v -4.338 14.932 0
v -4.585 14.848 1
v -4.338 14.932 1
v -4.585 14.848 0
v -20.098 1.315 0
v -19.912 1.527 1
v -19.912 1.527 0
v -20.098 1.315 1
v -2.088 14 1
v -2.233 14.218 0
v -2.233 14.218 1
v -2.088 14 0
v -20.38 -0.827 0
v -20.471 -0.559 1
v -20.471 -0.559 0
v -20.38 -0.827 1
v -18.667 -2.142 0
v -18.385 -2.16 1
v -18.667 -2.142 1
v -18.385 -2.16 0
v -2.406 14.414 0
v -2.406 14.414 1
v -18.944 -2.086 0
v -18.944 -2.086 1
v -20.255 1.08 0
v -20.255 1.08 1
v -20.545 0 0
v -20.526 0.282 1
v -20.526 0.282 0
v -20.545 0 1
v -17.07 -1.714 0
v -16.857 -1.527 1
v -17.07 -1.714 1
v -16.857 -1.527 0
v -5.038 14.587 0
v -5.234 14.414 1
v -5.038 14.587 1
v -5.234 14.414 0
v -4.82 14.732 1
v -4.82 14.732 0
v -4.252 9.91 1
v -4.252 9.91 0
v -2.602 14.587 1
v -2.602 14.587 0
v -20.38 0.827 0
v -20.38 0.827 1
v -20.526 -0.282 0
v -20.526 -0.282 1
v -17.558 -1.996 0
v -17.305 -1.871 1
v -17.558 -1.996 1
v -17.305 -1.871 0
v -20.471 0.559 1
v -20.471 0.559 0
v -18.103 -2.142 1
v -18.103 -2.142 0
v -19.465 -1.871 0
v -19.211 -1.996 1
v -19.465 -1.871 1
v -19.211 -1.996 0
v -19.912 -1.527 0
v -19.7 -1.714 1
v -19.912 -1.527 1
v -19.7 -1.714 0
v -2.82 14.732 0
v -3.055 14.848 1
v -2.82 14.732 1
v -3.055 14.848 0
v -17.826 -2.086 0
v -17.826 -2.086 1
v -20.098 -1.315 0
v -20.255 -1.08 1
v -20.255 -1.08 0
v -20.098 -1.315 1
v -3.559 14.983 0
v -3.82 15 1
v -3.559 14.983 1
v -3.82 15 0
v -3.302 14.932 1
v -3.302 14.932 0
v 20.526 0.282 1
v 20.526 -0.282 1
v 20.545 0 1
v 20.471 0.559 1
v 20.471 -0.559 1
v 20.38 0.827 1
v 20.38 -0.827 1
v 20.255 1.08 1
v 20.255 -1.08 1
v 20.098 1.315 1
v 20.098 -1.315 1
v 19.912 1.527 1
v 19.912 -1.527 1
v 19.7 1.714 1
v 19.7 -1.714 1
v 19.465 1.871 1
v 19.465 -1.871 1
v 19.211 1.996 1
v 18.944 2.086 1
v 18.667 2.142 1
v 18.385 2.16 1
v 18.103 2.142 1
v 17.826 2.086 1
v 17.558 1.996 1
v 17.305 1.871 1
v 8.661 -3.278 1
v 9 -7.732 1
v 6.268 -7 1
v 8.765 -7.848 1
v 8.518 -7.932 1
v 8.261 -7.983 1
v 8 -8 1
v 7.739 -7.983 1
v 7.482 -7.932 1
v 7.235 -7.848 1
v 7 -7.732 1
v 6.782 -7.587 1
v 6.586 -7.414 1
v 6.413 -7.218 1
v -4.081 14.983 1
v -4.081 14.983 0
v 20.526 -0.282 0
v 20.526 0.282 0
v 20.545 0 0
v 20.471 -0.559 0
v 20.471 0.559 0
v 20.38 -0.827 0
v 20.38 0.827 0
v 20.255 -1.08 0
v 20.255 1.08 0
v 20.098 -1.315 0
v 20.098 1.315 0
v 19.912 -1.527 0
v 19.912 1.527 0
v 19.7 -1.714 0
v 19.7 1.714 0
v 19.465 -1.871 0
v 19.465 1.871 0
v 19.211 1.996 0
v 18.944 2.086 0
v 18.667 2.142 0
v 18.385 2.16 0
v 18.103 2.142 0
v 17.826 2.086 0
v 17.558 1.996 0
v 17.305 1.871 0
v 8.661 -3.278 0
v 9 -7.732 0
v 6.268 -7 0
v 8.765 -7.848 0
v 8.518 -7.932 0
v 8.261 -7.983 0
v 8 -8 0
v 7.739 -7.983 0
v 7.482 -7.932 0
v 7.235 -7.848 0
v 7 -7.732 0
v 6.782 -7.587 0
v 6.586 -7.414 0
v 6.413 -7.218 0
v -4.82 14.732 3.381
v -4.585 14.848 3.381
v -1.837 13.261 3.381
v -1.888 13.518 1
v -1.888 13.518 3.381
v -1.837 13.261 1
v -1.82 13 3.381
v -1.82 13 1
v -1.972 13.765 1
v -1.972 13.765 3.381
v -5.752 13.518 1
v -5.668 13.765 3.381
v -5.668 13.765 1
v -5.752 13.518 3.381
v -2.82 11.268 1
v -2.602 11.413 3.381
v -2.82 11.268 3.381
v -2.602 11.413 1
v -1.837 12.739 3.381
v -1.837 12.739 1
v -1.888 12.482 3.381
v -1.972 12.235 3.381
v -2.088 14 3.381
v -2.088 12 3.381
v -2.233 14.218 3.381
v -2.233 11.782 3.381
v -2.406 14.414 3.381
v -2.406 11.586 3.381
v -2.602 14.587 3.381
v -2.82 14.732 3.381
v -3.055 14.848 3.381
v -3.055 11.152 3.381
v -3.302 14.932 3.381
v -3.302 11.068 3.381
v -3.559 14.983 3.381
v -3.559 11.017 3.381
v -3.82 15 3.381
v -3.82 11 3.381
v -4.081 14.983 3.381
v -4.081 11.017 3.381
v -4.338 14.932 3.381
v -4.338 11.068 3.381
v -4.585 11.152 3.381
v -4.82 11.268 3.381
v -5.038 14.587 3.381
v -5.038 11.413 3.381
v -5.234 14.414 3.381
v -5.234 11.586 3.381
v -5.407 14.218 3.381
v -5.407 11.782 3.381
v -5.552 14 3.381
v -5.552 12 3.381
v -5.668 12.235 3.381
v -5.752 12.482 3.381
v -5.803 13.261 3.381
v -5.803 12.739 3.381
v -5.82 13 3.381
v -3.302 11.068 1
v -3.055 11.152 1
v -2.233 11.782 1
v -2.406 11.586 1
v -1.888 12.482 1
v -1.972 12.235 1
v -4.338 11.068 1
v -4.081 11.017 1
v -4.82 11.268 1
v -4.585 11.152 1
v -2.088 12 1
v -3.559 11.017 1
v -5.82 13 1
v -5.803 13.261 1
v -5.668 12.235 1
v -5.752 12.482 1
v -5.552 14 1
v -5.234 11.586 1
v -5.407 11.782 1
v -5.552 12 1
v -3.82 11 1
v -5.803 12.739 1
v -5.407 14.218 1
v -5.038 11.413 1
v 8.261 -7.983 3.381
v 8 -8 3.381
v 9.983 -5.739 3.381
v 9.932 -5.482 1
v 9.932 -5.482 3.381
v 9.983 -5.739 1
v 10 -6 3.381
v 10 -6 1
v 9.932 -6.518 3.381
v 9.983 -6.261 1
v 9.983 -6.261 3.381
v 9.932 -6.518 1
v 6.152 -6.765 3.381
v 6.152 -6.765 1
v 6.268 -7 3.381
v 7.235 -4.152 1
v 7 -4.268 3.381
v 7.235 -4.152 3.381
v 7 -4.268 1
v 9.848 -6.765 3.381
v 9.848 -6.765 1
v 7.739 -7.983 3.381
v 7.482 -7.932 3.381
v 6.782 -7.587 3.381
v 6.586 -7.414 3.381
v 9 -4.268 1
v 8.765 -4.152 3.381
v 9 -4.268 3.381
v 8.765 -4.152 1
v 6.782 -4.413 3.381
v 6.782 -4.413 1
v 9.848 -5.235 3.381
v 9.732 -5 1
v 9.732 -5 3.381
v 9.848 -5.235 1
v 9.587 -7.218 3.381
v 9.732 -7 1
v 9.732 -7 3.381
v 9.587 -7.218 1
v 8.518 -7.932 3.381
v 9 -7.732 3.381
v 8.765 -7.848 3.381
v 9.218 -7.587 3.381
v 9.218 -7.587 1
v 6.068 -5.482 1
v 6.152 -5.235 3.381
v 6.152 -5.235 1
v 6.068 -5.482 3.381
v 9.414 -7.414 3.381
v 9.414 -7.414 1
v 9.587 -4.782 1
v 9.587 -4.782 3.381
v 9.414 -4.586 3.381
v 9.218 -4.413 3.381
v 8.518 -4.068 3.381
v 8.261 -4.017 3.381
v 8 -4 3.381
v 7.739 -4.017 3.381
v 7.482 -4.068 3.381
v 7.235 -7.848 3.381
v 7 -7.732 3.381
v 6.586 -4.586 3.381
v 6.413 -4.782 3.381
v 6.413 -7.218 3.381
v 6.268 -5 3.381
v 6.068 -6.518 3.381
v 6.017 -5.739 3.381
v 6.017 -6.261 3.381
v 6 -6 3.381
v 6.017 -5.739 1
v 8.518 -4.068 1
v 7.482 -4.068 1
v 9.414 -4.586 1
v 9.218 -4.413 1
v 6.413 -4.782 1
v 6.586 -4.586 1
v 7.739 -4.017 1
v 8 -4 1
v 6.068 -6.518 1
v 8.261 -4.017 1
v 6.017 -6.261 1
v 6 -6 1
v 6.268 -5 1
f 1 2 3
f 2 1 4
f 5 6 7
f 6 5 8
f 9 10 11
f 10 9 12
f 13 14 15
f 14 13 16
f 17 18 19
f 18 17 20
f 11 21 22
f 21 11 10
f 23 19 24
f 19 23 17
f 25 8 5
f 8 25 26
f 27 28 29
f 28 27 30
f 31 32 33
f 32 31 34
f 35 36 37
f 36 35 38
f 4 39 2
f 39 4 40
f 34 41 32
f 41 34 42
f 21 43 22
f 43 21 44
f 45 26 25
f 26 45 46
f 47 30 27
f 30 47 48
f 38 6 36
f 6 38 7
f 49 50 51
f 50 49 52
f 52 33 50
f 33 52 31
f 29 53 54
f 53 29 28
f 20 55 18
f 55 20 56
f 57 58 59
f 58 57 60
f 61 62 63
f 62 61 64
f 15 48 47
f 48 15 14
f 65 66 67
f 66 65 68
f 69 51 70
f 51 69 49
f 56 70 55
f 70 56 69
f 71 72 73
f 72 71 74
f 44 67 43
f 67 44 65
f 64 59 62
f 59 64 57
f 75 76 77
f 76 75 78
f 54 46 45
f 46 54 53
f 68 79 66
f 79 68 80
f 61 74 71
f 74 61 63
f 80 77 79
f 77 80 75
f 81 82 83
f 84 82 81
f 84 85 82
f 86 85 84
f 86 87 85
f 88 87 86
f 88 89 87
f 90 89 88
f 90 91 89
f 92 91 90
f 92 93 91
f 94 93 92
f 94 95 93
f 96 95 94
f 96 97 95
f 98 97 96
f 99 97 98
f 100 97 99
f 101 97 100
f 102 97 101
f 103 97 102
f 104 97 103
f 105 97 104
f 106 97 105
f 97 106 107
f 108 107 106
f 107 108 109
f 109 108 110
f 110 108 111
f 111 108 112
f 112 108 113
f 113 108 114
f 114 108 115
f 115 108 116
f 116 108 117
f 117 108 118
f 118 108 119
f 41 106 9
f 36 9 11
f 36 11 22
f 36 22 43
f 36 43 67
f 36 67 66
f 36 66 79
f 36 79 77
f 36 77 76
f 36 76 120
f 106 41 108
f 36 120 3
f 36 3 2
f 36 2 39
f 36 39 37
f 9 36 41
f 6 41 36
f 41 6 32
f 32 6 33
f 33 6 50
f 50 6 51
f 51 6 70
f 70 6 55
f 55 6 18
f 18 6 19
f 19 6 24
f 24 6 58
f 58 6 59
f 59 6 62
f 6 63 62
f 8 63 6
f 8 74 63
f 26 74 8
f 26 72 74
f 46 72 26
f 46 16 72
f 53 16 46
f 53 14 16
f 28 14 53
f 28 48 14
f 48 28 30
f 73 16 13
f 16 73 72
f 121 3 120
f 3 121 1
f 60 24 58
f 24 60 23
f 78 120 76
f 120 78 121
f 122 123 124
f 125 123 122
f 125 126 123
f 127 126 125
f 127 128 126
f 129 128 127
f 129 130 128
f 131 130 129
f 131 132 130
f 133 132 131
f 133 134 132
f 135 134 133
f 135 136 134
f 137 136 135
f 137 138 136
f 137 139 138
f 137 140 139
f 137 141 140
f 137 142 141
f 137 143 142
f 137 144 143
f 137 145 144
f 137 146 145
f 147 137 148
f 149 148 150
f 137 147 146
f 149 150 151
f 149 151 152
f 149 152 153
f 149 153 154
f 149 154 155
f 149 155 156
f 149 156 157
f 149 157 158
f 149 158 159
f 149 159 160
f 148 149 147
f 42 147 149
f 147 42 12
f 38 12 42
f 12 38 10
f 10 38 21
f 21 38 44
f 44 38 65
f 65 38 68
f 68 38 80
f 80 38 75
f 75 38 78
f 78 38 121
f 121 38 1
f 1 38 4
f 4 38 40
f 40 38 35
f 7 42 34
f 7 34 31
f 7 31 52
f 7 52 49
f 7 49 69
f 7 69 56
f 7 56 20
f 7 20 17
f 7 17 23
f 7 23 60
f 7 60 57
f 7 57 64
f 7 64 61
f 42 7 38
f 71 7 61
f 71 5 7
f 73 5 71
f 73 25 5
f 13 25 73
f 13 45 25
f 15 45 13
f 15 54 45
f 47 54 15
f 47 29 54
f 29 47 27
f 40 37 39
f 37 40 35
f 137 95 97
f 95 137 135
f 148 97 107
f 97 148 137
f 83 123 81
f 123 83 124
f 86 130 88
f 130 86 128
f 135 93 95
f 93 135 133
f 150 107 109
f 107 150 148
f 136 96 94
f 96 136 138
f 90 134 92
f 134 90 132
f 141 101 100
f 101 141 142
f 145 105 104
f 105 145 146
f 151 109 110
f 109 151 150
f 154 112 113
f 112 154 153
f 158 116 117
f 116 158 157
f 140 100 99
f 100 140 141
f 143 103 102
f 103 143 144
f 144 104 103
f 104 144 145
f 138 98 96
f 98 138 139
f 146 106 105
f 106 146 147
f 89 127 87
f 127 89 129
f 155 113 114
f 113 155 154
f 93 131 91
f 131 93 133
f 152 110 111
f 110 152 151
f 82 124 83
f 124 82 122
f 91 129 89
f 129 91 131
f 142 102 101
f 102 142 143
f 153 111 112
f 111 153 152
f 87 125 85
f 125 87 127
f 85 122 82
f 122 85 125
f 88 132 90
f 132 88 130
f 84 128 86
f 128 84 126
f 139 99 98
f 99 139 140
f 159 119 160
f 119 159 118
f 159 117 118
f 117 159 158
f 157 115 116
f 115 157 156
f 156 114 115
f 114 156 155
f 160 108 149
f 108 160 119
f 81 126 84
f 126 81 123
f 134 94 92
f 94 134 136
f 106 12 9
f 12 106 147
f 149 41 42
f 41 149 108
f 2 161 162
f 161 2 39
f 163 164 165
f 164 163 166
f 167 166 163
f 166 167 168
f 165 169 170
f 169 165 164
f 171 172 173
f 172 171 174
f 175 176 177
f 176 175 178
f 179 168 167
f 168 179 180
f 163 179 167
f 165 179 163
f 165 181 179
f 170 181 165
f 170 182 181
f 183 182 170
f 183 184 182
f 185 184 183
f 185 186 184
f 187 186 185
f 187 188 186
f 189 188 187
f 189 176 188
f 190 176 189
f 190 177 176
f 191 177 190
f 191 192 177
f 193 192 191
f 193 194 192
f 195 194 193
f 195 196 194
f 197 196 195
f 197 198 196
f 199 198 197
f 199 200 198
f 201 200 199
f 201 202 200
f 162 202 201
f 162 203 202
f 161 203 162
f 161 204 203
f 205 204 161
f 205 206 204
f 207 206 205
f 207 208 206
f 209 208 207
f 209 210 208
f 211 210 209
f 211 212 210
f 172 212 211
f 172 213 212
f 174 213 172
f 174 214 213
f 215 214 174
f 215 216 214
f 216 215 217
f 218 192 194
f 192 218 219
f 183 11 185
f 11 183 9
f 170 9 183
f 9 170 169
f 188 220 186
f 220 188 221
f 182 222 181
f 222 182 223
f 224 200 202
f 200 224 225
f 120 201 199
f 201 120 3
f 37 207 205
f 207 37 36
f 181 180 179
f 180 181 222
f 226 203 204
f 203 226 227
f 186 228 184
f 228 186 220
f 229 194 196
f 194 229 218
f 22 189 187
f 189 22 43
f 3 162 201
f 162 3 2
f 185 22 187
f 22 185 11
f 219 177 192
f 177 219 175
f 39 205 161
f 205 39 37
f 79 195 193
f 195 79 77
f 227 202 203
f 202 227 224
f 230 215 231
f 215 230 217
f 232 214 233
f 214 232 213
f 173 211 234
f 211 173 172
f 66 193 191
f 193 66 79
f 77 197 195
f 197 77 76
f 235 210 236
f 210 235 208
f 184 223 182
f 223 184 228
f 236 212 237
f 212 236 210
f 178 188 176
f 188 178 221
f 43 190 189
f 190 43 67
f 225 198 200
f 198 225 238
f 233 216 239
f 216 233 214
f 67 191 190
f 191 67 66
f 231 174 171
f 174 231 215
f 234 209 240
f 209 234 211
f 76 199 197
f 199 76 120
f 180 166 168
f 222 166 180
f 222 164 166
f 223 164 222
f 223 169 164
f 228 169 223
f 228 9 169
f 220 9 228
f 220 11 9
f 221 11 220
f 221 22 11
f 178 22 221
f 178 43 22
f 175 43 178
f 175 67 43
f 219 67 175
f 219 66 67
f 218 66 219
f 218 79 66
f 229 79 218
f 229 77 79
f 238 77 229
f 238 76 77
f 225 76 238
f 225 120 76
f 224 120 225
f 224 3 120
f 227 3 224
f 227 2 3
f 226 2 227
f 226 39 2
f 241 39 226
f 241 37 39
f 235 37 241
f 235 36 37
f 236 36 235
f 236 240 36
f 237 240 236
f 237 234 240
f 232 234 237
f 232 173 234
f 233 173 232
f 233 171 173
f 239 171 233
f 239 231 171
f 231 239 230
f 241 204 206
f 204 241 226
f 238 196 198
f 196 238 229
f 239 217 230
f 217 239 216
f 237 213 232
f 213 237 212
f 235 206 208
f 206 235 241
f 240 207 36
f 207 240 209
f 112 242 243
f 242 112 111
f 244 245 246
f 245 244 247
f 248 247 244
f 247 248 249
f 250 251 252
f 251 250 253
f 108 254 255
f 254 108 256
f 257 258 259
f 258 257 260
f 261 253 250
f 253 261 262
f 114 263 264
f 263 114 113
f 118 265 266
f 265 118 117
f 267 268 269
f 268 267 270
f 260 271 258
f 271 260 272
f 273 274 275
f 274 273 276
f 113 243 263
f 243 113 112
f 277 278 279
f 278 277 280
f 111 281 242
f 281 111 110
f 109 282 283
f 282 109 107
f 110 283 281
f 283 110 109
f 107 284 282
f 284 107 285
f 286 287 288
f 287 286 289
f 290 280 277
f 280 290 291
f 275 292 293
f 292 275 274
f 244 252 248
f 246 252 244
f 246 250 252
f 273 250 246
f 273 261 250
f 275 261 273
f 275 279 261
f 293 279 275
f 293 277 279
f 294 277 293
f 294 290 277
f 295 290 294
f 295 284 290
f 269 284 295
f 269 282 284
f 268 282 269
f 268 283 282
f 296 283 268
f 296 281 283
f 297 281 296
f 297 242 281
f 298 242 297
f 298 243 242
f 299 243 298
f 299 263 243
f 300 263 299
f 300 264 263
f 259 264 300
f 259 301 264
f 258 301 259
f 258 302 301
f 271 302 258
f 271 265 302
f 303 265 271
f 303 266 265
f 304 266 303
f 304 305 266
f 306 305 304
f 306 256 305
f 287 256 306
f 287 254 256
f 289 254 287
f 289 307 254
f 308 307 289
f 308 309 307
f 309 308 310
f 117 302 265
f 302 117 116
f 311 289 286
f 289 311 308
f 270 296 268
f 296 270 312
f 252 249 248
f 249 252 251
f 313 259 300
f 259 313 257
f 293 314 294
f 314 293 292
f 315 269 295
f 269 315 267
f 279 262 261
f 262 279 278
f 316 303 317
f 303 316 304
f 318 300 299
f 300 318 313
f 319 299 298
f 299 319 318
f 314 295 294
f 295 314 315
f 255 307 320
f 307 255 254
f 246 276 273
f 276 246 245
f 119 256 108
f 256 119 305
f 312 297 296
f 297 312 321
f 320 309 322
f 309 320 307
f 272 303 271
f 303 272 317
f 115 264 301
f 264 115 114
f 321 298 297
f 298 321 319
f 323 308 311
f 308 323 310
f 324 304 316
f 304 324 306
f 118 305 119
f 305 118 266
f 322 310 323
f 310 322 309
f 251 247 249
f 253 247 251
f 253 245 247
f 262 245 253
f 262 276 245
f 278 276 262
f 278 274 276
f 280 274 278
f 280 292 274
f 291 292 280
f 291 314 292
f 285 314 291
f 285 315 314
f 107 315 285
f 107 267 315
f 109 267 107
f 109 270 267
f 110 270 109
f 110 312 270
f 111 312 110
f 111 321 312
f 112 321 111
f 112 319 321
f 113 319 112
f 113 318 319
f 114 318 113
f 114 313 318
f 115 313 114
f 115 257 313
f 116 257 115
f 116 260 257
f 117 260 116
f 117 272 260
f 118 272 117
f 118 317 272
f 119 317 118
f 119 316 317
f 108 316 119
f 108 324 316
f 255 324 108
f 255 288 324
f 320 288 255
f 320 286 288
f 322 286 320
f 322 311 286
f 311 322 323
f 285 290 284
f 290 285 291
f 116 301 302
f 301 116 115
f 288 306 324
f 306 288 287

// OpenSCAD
VERSION = 1;
INF = 50;

$fn = 48;
MOUNT_PATTERN_LENGTH = 26; 
SCREW_R = 0.6;
SCREW_HEAD_R = 2.16;

mount_r = SCREW_HEAD_R;
frame_w = 2.0;
thickness = 1.0;

//For #00 screw, 3/32in
tap_r = 2; //0.05in r  
tap_h = 2.38125; //3/32in 
vtx_h = 15;//18;
vtx_w = 18;
//cylinder(h=thickness, r = SCREW_HEAD_R);

sidewall_h = 2;
y_offset = 6;
module wall(length){
	cube([thickness, length,2]);
}

module shell(){


	minkowski_h = thickness/2.0;
	intersection(){
		minkowski(){
			difference(){
				cube([INF, INF, minkowski_h], center=true);
				arm(INF);
			}
			cylinder(h=minkowski_h, r = frame_w, center=true);
		}
		arm(thickness);
		}

}

module add_mount(){
	difference(){
		union(){
			cylinder(h=thickness, r = mount_r, center=true);
			shell();
		}
		cylinder(h=INF, r = SCREW_R, center=true);
	}
}



module arm(_thickness){

	y_offset = 6;
	x = sin(45)*MOUNT_PATTERN_LENGTH;
	//Create solid arm
	hull(){
		cylinder(h=_thickness, r = mount_r, center=true);
		translate([x, vtx_h/2.0 - y_offset , 0]) cube([1, vtx_h, _thickness], center=true);
	}
}

module vtx_case_brace(){
	brace_w = 2;
	rotation = atan(vtx_w/vtx_h);
	intersection(){
		union(){
			rotate([0, 0, rotation]) cube([brace_w, INF, thickness], center=true);
			rotate([0, 0, -rotation]) cube([brace_w, INF, thickness], center=true);
		}
		cube([vtx_w, vtx_h, thickness], center=true);
	}
}
module vtx_case(){
	union(){
		difference(){
			cube([vtx_w, vtx_h, thickness], center=true);
			cube([vtx_w-(2*frame_w), vtx_h-(2*frame_w), INF], center=true);
		}
	vtx_case_brace();
	}
}
module sidewalls(){
	x = 4;
	y = 1.5;
	z = sidewall_h + thickness;

	translate([0, -y/2.0 - vtx_h/2.0 , z/2.0]) cube([x, y,z ], center=true);
}

//arm();
//shell();
//add_mount();


module frame(){
	x = sin(45)*MOUNT_PATTERN_LENGTH;
	union(){
		translate([0, vtx_h/2.0 - y_offset, 0]) vtx_case();
		//Remove the excess 
		difference(){
			union(){
				translate([-x, 0, 0]) add_mount();
				mirror([1, 0, 0])translate([-x, 0, 0])  add_mount();
			}
			cube([vtx_w, INF, INF], center=true);
		}
	}
}
//vtx_case_brace();

/*
union(){
	//import("libs/screw.stl");
	translate([0, 0, thickness/2.0]) frame();
	//sidewalls();
	//Add taps
	cylinder(h=tap_h, r= tap_r);
}
*/


w = sin(45)*MOUNT_PATTERN_LENGTH;
i =  w - vtx_w/2.0;
y_mount2 = 6;

module left_mount(){
	translate([-w, 0, 0]) cylinder(h=thickness, r = mount_r, center=true);
}
module right_mount(){
	translate([w, 0, 0]) cylinder(h=thickness, r = mount_r, center=true);
}

module bottom_tap(h){
	translate([vtx_w/2.0 - 1, -y_mount2, 0]) cylinder(h=h, r= tap_r, center=true);
}
module top_tap(h){
	translate([-vtx_w/2.0 + 5.18, 13, 0]) cylinder(h=h, r= tap_r, center=true);
}

module simple_frame(){
	hull(){
		left_mount();
		top_tap(thickness);
	}
	hull(){
		right_mount();
		bottom_tap(thickness);
	}

	hull(){
		top_tap(thickness);
		bottom_tap(thickness);
	}
}

union(){
	translate([0, 0, thickness/2.0]) simple_frame();
	translate([0, 0, tap_h/2.0 + thickness]){
	top_tap(tap_h);
	bottom_tap(tap_h);
	}
}
